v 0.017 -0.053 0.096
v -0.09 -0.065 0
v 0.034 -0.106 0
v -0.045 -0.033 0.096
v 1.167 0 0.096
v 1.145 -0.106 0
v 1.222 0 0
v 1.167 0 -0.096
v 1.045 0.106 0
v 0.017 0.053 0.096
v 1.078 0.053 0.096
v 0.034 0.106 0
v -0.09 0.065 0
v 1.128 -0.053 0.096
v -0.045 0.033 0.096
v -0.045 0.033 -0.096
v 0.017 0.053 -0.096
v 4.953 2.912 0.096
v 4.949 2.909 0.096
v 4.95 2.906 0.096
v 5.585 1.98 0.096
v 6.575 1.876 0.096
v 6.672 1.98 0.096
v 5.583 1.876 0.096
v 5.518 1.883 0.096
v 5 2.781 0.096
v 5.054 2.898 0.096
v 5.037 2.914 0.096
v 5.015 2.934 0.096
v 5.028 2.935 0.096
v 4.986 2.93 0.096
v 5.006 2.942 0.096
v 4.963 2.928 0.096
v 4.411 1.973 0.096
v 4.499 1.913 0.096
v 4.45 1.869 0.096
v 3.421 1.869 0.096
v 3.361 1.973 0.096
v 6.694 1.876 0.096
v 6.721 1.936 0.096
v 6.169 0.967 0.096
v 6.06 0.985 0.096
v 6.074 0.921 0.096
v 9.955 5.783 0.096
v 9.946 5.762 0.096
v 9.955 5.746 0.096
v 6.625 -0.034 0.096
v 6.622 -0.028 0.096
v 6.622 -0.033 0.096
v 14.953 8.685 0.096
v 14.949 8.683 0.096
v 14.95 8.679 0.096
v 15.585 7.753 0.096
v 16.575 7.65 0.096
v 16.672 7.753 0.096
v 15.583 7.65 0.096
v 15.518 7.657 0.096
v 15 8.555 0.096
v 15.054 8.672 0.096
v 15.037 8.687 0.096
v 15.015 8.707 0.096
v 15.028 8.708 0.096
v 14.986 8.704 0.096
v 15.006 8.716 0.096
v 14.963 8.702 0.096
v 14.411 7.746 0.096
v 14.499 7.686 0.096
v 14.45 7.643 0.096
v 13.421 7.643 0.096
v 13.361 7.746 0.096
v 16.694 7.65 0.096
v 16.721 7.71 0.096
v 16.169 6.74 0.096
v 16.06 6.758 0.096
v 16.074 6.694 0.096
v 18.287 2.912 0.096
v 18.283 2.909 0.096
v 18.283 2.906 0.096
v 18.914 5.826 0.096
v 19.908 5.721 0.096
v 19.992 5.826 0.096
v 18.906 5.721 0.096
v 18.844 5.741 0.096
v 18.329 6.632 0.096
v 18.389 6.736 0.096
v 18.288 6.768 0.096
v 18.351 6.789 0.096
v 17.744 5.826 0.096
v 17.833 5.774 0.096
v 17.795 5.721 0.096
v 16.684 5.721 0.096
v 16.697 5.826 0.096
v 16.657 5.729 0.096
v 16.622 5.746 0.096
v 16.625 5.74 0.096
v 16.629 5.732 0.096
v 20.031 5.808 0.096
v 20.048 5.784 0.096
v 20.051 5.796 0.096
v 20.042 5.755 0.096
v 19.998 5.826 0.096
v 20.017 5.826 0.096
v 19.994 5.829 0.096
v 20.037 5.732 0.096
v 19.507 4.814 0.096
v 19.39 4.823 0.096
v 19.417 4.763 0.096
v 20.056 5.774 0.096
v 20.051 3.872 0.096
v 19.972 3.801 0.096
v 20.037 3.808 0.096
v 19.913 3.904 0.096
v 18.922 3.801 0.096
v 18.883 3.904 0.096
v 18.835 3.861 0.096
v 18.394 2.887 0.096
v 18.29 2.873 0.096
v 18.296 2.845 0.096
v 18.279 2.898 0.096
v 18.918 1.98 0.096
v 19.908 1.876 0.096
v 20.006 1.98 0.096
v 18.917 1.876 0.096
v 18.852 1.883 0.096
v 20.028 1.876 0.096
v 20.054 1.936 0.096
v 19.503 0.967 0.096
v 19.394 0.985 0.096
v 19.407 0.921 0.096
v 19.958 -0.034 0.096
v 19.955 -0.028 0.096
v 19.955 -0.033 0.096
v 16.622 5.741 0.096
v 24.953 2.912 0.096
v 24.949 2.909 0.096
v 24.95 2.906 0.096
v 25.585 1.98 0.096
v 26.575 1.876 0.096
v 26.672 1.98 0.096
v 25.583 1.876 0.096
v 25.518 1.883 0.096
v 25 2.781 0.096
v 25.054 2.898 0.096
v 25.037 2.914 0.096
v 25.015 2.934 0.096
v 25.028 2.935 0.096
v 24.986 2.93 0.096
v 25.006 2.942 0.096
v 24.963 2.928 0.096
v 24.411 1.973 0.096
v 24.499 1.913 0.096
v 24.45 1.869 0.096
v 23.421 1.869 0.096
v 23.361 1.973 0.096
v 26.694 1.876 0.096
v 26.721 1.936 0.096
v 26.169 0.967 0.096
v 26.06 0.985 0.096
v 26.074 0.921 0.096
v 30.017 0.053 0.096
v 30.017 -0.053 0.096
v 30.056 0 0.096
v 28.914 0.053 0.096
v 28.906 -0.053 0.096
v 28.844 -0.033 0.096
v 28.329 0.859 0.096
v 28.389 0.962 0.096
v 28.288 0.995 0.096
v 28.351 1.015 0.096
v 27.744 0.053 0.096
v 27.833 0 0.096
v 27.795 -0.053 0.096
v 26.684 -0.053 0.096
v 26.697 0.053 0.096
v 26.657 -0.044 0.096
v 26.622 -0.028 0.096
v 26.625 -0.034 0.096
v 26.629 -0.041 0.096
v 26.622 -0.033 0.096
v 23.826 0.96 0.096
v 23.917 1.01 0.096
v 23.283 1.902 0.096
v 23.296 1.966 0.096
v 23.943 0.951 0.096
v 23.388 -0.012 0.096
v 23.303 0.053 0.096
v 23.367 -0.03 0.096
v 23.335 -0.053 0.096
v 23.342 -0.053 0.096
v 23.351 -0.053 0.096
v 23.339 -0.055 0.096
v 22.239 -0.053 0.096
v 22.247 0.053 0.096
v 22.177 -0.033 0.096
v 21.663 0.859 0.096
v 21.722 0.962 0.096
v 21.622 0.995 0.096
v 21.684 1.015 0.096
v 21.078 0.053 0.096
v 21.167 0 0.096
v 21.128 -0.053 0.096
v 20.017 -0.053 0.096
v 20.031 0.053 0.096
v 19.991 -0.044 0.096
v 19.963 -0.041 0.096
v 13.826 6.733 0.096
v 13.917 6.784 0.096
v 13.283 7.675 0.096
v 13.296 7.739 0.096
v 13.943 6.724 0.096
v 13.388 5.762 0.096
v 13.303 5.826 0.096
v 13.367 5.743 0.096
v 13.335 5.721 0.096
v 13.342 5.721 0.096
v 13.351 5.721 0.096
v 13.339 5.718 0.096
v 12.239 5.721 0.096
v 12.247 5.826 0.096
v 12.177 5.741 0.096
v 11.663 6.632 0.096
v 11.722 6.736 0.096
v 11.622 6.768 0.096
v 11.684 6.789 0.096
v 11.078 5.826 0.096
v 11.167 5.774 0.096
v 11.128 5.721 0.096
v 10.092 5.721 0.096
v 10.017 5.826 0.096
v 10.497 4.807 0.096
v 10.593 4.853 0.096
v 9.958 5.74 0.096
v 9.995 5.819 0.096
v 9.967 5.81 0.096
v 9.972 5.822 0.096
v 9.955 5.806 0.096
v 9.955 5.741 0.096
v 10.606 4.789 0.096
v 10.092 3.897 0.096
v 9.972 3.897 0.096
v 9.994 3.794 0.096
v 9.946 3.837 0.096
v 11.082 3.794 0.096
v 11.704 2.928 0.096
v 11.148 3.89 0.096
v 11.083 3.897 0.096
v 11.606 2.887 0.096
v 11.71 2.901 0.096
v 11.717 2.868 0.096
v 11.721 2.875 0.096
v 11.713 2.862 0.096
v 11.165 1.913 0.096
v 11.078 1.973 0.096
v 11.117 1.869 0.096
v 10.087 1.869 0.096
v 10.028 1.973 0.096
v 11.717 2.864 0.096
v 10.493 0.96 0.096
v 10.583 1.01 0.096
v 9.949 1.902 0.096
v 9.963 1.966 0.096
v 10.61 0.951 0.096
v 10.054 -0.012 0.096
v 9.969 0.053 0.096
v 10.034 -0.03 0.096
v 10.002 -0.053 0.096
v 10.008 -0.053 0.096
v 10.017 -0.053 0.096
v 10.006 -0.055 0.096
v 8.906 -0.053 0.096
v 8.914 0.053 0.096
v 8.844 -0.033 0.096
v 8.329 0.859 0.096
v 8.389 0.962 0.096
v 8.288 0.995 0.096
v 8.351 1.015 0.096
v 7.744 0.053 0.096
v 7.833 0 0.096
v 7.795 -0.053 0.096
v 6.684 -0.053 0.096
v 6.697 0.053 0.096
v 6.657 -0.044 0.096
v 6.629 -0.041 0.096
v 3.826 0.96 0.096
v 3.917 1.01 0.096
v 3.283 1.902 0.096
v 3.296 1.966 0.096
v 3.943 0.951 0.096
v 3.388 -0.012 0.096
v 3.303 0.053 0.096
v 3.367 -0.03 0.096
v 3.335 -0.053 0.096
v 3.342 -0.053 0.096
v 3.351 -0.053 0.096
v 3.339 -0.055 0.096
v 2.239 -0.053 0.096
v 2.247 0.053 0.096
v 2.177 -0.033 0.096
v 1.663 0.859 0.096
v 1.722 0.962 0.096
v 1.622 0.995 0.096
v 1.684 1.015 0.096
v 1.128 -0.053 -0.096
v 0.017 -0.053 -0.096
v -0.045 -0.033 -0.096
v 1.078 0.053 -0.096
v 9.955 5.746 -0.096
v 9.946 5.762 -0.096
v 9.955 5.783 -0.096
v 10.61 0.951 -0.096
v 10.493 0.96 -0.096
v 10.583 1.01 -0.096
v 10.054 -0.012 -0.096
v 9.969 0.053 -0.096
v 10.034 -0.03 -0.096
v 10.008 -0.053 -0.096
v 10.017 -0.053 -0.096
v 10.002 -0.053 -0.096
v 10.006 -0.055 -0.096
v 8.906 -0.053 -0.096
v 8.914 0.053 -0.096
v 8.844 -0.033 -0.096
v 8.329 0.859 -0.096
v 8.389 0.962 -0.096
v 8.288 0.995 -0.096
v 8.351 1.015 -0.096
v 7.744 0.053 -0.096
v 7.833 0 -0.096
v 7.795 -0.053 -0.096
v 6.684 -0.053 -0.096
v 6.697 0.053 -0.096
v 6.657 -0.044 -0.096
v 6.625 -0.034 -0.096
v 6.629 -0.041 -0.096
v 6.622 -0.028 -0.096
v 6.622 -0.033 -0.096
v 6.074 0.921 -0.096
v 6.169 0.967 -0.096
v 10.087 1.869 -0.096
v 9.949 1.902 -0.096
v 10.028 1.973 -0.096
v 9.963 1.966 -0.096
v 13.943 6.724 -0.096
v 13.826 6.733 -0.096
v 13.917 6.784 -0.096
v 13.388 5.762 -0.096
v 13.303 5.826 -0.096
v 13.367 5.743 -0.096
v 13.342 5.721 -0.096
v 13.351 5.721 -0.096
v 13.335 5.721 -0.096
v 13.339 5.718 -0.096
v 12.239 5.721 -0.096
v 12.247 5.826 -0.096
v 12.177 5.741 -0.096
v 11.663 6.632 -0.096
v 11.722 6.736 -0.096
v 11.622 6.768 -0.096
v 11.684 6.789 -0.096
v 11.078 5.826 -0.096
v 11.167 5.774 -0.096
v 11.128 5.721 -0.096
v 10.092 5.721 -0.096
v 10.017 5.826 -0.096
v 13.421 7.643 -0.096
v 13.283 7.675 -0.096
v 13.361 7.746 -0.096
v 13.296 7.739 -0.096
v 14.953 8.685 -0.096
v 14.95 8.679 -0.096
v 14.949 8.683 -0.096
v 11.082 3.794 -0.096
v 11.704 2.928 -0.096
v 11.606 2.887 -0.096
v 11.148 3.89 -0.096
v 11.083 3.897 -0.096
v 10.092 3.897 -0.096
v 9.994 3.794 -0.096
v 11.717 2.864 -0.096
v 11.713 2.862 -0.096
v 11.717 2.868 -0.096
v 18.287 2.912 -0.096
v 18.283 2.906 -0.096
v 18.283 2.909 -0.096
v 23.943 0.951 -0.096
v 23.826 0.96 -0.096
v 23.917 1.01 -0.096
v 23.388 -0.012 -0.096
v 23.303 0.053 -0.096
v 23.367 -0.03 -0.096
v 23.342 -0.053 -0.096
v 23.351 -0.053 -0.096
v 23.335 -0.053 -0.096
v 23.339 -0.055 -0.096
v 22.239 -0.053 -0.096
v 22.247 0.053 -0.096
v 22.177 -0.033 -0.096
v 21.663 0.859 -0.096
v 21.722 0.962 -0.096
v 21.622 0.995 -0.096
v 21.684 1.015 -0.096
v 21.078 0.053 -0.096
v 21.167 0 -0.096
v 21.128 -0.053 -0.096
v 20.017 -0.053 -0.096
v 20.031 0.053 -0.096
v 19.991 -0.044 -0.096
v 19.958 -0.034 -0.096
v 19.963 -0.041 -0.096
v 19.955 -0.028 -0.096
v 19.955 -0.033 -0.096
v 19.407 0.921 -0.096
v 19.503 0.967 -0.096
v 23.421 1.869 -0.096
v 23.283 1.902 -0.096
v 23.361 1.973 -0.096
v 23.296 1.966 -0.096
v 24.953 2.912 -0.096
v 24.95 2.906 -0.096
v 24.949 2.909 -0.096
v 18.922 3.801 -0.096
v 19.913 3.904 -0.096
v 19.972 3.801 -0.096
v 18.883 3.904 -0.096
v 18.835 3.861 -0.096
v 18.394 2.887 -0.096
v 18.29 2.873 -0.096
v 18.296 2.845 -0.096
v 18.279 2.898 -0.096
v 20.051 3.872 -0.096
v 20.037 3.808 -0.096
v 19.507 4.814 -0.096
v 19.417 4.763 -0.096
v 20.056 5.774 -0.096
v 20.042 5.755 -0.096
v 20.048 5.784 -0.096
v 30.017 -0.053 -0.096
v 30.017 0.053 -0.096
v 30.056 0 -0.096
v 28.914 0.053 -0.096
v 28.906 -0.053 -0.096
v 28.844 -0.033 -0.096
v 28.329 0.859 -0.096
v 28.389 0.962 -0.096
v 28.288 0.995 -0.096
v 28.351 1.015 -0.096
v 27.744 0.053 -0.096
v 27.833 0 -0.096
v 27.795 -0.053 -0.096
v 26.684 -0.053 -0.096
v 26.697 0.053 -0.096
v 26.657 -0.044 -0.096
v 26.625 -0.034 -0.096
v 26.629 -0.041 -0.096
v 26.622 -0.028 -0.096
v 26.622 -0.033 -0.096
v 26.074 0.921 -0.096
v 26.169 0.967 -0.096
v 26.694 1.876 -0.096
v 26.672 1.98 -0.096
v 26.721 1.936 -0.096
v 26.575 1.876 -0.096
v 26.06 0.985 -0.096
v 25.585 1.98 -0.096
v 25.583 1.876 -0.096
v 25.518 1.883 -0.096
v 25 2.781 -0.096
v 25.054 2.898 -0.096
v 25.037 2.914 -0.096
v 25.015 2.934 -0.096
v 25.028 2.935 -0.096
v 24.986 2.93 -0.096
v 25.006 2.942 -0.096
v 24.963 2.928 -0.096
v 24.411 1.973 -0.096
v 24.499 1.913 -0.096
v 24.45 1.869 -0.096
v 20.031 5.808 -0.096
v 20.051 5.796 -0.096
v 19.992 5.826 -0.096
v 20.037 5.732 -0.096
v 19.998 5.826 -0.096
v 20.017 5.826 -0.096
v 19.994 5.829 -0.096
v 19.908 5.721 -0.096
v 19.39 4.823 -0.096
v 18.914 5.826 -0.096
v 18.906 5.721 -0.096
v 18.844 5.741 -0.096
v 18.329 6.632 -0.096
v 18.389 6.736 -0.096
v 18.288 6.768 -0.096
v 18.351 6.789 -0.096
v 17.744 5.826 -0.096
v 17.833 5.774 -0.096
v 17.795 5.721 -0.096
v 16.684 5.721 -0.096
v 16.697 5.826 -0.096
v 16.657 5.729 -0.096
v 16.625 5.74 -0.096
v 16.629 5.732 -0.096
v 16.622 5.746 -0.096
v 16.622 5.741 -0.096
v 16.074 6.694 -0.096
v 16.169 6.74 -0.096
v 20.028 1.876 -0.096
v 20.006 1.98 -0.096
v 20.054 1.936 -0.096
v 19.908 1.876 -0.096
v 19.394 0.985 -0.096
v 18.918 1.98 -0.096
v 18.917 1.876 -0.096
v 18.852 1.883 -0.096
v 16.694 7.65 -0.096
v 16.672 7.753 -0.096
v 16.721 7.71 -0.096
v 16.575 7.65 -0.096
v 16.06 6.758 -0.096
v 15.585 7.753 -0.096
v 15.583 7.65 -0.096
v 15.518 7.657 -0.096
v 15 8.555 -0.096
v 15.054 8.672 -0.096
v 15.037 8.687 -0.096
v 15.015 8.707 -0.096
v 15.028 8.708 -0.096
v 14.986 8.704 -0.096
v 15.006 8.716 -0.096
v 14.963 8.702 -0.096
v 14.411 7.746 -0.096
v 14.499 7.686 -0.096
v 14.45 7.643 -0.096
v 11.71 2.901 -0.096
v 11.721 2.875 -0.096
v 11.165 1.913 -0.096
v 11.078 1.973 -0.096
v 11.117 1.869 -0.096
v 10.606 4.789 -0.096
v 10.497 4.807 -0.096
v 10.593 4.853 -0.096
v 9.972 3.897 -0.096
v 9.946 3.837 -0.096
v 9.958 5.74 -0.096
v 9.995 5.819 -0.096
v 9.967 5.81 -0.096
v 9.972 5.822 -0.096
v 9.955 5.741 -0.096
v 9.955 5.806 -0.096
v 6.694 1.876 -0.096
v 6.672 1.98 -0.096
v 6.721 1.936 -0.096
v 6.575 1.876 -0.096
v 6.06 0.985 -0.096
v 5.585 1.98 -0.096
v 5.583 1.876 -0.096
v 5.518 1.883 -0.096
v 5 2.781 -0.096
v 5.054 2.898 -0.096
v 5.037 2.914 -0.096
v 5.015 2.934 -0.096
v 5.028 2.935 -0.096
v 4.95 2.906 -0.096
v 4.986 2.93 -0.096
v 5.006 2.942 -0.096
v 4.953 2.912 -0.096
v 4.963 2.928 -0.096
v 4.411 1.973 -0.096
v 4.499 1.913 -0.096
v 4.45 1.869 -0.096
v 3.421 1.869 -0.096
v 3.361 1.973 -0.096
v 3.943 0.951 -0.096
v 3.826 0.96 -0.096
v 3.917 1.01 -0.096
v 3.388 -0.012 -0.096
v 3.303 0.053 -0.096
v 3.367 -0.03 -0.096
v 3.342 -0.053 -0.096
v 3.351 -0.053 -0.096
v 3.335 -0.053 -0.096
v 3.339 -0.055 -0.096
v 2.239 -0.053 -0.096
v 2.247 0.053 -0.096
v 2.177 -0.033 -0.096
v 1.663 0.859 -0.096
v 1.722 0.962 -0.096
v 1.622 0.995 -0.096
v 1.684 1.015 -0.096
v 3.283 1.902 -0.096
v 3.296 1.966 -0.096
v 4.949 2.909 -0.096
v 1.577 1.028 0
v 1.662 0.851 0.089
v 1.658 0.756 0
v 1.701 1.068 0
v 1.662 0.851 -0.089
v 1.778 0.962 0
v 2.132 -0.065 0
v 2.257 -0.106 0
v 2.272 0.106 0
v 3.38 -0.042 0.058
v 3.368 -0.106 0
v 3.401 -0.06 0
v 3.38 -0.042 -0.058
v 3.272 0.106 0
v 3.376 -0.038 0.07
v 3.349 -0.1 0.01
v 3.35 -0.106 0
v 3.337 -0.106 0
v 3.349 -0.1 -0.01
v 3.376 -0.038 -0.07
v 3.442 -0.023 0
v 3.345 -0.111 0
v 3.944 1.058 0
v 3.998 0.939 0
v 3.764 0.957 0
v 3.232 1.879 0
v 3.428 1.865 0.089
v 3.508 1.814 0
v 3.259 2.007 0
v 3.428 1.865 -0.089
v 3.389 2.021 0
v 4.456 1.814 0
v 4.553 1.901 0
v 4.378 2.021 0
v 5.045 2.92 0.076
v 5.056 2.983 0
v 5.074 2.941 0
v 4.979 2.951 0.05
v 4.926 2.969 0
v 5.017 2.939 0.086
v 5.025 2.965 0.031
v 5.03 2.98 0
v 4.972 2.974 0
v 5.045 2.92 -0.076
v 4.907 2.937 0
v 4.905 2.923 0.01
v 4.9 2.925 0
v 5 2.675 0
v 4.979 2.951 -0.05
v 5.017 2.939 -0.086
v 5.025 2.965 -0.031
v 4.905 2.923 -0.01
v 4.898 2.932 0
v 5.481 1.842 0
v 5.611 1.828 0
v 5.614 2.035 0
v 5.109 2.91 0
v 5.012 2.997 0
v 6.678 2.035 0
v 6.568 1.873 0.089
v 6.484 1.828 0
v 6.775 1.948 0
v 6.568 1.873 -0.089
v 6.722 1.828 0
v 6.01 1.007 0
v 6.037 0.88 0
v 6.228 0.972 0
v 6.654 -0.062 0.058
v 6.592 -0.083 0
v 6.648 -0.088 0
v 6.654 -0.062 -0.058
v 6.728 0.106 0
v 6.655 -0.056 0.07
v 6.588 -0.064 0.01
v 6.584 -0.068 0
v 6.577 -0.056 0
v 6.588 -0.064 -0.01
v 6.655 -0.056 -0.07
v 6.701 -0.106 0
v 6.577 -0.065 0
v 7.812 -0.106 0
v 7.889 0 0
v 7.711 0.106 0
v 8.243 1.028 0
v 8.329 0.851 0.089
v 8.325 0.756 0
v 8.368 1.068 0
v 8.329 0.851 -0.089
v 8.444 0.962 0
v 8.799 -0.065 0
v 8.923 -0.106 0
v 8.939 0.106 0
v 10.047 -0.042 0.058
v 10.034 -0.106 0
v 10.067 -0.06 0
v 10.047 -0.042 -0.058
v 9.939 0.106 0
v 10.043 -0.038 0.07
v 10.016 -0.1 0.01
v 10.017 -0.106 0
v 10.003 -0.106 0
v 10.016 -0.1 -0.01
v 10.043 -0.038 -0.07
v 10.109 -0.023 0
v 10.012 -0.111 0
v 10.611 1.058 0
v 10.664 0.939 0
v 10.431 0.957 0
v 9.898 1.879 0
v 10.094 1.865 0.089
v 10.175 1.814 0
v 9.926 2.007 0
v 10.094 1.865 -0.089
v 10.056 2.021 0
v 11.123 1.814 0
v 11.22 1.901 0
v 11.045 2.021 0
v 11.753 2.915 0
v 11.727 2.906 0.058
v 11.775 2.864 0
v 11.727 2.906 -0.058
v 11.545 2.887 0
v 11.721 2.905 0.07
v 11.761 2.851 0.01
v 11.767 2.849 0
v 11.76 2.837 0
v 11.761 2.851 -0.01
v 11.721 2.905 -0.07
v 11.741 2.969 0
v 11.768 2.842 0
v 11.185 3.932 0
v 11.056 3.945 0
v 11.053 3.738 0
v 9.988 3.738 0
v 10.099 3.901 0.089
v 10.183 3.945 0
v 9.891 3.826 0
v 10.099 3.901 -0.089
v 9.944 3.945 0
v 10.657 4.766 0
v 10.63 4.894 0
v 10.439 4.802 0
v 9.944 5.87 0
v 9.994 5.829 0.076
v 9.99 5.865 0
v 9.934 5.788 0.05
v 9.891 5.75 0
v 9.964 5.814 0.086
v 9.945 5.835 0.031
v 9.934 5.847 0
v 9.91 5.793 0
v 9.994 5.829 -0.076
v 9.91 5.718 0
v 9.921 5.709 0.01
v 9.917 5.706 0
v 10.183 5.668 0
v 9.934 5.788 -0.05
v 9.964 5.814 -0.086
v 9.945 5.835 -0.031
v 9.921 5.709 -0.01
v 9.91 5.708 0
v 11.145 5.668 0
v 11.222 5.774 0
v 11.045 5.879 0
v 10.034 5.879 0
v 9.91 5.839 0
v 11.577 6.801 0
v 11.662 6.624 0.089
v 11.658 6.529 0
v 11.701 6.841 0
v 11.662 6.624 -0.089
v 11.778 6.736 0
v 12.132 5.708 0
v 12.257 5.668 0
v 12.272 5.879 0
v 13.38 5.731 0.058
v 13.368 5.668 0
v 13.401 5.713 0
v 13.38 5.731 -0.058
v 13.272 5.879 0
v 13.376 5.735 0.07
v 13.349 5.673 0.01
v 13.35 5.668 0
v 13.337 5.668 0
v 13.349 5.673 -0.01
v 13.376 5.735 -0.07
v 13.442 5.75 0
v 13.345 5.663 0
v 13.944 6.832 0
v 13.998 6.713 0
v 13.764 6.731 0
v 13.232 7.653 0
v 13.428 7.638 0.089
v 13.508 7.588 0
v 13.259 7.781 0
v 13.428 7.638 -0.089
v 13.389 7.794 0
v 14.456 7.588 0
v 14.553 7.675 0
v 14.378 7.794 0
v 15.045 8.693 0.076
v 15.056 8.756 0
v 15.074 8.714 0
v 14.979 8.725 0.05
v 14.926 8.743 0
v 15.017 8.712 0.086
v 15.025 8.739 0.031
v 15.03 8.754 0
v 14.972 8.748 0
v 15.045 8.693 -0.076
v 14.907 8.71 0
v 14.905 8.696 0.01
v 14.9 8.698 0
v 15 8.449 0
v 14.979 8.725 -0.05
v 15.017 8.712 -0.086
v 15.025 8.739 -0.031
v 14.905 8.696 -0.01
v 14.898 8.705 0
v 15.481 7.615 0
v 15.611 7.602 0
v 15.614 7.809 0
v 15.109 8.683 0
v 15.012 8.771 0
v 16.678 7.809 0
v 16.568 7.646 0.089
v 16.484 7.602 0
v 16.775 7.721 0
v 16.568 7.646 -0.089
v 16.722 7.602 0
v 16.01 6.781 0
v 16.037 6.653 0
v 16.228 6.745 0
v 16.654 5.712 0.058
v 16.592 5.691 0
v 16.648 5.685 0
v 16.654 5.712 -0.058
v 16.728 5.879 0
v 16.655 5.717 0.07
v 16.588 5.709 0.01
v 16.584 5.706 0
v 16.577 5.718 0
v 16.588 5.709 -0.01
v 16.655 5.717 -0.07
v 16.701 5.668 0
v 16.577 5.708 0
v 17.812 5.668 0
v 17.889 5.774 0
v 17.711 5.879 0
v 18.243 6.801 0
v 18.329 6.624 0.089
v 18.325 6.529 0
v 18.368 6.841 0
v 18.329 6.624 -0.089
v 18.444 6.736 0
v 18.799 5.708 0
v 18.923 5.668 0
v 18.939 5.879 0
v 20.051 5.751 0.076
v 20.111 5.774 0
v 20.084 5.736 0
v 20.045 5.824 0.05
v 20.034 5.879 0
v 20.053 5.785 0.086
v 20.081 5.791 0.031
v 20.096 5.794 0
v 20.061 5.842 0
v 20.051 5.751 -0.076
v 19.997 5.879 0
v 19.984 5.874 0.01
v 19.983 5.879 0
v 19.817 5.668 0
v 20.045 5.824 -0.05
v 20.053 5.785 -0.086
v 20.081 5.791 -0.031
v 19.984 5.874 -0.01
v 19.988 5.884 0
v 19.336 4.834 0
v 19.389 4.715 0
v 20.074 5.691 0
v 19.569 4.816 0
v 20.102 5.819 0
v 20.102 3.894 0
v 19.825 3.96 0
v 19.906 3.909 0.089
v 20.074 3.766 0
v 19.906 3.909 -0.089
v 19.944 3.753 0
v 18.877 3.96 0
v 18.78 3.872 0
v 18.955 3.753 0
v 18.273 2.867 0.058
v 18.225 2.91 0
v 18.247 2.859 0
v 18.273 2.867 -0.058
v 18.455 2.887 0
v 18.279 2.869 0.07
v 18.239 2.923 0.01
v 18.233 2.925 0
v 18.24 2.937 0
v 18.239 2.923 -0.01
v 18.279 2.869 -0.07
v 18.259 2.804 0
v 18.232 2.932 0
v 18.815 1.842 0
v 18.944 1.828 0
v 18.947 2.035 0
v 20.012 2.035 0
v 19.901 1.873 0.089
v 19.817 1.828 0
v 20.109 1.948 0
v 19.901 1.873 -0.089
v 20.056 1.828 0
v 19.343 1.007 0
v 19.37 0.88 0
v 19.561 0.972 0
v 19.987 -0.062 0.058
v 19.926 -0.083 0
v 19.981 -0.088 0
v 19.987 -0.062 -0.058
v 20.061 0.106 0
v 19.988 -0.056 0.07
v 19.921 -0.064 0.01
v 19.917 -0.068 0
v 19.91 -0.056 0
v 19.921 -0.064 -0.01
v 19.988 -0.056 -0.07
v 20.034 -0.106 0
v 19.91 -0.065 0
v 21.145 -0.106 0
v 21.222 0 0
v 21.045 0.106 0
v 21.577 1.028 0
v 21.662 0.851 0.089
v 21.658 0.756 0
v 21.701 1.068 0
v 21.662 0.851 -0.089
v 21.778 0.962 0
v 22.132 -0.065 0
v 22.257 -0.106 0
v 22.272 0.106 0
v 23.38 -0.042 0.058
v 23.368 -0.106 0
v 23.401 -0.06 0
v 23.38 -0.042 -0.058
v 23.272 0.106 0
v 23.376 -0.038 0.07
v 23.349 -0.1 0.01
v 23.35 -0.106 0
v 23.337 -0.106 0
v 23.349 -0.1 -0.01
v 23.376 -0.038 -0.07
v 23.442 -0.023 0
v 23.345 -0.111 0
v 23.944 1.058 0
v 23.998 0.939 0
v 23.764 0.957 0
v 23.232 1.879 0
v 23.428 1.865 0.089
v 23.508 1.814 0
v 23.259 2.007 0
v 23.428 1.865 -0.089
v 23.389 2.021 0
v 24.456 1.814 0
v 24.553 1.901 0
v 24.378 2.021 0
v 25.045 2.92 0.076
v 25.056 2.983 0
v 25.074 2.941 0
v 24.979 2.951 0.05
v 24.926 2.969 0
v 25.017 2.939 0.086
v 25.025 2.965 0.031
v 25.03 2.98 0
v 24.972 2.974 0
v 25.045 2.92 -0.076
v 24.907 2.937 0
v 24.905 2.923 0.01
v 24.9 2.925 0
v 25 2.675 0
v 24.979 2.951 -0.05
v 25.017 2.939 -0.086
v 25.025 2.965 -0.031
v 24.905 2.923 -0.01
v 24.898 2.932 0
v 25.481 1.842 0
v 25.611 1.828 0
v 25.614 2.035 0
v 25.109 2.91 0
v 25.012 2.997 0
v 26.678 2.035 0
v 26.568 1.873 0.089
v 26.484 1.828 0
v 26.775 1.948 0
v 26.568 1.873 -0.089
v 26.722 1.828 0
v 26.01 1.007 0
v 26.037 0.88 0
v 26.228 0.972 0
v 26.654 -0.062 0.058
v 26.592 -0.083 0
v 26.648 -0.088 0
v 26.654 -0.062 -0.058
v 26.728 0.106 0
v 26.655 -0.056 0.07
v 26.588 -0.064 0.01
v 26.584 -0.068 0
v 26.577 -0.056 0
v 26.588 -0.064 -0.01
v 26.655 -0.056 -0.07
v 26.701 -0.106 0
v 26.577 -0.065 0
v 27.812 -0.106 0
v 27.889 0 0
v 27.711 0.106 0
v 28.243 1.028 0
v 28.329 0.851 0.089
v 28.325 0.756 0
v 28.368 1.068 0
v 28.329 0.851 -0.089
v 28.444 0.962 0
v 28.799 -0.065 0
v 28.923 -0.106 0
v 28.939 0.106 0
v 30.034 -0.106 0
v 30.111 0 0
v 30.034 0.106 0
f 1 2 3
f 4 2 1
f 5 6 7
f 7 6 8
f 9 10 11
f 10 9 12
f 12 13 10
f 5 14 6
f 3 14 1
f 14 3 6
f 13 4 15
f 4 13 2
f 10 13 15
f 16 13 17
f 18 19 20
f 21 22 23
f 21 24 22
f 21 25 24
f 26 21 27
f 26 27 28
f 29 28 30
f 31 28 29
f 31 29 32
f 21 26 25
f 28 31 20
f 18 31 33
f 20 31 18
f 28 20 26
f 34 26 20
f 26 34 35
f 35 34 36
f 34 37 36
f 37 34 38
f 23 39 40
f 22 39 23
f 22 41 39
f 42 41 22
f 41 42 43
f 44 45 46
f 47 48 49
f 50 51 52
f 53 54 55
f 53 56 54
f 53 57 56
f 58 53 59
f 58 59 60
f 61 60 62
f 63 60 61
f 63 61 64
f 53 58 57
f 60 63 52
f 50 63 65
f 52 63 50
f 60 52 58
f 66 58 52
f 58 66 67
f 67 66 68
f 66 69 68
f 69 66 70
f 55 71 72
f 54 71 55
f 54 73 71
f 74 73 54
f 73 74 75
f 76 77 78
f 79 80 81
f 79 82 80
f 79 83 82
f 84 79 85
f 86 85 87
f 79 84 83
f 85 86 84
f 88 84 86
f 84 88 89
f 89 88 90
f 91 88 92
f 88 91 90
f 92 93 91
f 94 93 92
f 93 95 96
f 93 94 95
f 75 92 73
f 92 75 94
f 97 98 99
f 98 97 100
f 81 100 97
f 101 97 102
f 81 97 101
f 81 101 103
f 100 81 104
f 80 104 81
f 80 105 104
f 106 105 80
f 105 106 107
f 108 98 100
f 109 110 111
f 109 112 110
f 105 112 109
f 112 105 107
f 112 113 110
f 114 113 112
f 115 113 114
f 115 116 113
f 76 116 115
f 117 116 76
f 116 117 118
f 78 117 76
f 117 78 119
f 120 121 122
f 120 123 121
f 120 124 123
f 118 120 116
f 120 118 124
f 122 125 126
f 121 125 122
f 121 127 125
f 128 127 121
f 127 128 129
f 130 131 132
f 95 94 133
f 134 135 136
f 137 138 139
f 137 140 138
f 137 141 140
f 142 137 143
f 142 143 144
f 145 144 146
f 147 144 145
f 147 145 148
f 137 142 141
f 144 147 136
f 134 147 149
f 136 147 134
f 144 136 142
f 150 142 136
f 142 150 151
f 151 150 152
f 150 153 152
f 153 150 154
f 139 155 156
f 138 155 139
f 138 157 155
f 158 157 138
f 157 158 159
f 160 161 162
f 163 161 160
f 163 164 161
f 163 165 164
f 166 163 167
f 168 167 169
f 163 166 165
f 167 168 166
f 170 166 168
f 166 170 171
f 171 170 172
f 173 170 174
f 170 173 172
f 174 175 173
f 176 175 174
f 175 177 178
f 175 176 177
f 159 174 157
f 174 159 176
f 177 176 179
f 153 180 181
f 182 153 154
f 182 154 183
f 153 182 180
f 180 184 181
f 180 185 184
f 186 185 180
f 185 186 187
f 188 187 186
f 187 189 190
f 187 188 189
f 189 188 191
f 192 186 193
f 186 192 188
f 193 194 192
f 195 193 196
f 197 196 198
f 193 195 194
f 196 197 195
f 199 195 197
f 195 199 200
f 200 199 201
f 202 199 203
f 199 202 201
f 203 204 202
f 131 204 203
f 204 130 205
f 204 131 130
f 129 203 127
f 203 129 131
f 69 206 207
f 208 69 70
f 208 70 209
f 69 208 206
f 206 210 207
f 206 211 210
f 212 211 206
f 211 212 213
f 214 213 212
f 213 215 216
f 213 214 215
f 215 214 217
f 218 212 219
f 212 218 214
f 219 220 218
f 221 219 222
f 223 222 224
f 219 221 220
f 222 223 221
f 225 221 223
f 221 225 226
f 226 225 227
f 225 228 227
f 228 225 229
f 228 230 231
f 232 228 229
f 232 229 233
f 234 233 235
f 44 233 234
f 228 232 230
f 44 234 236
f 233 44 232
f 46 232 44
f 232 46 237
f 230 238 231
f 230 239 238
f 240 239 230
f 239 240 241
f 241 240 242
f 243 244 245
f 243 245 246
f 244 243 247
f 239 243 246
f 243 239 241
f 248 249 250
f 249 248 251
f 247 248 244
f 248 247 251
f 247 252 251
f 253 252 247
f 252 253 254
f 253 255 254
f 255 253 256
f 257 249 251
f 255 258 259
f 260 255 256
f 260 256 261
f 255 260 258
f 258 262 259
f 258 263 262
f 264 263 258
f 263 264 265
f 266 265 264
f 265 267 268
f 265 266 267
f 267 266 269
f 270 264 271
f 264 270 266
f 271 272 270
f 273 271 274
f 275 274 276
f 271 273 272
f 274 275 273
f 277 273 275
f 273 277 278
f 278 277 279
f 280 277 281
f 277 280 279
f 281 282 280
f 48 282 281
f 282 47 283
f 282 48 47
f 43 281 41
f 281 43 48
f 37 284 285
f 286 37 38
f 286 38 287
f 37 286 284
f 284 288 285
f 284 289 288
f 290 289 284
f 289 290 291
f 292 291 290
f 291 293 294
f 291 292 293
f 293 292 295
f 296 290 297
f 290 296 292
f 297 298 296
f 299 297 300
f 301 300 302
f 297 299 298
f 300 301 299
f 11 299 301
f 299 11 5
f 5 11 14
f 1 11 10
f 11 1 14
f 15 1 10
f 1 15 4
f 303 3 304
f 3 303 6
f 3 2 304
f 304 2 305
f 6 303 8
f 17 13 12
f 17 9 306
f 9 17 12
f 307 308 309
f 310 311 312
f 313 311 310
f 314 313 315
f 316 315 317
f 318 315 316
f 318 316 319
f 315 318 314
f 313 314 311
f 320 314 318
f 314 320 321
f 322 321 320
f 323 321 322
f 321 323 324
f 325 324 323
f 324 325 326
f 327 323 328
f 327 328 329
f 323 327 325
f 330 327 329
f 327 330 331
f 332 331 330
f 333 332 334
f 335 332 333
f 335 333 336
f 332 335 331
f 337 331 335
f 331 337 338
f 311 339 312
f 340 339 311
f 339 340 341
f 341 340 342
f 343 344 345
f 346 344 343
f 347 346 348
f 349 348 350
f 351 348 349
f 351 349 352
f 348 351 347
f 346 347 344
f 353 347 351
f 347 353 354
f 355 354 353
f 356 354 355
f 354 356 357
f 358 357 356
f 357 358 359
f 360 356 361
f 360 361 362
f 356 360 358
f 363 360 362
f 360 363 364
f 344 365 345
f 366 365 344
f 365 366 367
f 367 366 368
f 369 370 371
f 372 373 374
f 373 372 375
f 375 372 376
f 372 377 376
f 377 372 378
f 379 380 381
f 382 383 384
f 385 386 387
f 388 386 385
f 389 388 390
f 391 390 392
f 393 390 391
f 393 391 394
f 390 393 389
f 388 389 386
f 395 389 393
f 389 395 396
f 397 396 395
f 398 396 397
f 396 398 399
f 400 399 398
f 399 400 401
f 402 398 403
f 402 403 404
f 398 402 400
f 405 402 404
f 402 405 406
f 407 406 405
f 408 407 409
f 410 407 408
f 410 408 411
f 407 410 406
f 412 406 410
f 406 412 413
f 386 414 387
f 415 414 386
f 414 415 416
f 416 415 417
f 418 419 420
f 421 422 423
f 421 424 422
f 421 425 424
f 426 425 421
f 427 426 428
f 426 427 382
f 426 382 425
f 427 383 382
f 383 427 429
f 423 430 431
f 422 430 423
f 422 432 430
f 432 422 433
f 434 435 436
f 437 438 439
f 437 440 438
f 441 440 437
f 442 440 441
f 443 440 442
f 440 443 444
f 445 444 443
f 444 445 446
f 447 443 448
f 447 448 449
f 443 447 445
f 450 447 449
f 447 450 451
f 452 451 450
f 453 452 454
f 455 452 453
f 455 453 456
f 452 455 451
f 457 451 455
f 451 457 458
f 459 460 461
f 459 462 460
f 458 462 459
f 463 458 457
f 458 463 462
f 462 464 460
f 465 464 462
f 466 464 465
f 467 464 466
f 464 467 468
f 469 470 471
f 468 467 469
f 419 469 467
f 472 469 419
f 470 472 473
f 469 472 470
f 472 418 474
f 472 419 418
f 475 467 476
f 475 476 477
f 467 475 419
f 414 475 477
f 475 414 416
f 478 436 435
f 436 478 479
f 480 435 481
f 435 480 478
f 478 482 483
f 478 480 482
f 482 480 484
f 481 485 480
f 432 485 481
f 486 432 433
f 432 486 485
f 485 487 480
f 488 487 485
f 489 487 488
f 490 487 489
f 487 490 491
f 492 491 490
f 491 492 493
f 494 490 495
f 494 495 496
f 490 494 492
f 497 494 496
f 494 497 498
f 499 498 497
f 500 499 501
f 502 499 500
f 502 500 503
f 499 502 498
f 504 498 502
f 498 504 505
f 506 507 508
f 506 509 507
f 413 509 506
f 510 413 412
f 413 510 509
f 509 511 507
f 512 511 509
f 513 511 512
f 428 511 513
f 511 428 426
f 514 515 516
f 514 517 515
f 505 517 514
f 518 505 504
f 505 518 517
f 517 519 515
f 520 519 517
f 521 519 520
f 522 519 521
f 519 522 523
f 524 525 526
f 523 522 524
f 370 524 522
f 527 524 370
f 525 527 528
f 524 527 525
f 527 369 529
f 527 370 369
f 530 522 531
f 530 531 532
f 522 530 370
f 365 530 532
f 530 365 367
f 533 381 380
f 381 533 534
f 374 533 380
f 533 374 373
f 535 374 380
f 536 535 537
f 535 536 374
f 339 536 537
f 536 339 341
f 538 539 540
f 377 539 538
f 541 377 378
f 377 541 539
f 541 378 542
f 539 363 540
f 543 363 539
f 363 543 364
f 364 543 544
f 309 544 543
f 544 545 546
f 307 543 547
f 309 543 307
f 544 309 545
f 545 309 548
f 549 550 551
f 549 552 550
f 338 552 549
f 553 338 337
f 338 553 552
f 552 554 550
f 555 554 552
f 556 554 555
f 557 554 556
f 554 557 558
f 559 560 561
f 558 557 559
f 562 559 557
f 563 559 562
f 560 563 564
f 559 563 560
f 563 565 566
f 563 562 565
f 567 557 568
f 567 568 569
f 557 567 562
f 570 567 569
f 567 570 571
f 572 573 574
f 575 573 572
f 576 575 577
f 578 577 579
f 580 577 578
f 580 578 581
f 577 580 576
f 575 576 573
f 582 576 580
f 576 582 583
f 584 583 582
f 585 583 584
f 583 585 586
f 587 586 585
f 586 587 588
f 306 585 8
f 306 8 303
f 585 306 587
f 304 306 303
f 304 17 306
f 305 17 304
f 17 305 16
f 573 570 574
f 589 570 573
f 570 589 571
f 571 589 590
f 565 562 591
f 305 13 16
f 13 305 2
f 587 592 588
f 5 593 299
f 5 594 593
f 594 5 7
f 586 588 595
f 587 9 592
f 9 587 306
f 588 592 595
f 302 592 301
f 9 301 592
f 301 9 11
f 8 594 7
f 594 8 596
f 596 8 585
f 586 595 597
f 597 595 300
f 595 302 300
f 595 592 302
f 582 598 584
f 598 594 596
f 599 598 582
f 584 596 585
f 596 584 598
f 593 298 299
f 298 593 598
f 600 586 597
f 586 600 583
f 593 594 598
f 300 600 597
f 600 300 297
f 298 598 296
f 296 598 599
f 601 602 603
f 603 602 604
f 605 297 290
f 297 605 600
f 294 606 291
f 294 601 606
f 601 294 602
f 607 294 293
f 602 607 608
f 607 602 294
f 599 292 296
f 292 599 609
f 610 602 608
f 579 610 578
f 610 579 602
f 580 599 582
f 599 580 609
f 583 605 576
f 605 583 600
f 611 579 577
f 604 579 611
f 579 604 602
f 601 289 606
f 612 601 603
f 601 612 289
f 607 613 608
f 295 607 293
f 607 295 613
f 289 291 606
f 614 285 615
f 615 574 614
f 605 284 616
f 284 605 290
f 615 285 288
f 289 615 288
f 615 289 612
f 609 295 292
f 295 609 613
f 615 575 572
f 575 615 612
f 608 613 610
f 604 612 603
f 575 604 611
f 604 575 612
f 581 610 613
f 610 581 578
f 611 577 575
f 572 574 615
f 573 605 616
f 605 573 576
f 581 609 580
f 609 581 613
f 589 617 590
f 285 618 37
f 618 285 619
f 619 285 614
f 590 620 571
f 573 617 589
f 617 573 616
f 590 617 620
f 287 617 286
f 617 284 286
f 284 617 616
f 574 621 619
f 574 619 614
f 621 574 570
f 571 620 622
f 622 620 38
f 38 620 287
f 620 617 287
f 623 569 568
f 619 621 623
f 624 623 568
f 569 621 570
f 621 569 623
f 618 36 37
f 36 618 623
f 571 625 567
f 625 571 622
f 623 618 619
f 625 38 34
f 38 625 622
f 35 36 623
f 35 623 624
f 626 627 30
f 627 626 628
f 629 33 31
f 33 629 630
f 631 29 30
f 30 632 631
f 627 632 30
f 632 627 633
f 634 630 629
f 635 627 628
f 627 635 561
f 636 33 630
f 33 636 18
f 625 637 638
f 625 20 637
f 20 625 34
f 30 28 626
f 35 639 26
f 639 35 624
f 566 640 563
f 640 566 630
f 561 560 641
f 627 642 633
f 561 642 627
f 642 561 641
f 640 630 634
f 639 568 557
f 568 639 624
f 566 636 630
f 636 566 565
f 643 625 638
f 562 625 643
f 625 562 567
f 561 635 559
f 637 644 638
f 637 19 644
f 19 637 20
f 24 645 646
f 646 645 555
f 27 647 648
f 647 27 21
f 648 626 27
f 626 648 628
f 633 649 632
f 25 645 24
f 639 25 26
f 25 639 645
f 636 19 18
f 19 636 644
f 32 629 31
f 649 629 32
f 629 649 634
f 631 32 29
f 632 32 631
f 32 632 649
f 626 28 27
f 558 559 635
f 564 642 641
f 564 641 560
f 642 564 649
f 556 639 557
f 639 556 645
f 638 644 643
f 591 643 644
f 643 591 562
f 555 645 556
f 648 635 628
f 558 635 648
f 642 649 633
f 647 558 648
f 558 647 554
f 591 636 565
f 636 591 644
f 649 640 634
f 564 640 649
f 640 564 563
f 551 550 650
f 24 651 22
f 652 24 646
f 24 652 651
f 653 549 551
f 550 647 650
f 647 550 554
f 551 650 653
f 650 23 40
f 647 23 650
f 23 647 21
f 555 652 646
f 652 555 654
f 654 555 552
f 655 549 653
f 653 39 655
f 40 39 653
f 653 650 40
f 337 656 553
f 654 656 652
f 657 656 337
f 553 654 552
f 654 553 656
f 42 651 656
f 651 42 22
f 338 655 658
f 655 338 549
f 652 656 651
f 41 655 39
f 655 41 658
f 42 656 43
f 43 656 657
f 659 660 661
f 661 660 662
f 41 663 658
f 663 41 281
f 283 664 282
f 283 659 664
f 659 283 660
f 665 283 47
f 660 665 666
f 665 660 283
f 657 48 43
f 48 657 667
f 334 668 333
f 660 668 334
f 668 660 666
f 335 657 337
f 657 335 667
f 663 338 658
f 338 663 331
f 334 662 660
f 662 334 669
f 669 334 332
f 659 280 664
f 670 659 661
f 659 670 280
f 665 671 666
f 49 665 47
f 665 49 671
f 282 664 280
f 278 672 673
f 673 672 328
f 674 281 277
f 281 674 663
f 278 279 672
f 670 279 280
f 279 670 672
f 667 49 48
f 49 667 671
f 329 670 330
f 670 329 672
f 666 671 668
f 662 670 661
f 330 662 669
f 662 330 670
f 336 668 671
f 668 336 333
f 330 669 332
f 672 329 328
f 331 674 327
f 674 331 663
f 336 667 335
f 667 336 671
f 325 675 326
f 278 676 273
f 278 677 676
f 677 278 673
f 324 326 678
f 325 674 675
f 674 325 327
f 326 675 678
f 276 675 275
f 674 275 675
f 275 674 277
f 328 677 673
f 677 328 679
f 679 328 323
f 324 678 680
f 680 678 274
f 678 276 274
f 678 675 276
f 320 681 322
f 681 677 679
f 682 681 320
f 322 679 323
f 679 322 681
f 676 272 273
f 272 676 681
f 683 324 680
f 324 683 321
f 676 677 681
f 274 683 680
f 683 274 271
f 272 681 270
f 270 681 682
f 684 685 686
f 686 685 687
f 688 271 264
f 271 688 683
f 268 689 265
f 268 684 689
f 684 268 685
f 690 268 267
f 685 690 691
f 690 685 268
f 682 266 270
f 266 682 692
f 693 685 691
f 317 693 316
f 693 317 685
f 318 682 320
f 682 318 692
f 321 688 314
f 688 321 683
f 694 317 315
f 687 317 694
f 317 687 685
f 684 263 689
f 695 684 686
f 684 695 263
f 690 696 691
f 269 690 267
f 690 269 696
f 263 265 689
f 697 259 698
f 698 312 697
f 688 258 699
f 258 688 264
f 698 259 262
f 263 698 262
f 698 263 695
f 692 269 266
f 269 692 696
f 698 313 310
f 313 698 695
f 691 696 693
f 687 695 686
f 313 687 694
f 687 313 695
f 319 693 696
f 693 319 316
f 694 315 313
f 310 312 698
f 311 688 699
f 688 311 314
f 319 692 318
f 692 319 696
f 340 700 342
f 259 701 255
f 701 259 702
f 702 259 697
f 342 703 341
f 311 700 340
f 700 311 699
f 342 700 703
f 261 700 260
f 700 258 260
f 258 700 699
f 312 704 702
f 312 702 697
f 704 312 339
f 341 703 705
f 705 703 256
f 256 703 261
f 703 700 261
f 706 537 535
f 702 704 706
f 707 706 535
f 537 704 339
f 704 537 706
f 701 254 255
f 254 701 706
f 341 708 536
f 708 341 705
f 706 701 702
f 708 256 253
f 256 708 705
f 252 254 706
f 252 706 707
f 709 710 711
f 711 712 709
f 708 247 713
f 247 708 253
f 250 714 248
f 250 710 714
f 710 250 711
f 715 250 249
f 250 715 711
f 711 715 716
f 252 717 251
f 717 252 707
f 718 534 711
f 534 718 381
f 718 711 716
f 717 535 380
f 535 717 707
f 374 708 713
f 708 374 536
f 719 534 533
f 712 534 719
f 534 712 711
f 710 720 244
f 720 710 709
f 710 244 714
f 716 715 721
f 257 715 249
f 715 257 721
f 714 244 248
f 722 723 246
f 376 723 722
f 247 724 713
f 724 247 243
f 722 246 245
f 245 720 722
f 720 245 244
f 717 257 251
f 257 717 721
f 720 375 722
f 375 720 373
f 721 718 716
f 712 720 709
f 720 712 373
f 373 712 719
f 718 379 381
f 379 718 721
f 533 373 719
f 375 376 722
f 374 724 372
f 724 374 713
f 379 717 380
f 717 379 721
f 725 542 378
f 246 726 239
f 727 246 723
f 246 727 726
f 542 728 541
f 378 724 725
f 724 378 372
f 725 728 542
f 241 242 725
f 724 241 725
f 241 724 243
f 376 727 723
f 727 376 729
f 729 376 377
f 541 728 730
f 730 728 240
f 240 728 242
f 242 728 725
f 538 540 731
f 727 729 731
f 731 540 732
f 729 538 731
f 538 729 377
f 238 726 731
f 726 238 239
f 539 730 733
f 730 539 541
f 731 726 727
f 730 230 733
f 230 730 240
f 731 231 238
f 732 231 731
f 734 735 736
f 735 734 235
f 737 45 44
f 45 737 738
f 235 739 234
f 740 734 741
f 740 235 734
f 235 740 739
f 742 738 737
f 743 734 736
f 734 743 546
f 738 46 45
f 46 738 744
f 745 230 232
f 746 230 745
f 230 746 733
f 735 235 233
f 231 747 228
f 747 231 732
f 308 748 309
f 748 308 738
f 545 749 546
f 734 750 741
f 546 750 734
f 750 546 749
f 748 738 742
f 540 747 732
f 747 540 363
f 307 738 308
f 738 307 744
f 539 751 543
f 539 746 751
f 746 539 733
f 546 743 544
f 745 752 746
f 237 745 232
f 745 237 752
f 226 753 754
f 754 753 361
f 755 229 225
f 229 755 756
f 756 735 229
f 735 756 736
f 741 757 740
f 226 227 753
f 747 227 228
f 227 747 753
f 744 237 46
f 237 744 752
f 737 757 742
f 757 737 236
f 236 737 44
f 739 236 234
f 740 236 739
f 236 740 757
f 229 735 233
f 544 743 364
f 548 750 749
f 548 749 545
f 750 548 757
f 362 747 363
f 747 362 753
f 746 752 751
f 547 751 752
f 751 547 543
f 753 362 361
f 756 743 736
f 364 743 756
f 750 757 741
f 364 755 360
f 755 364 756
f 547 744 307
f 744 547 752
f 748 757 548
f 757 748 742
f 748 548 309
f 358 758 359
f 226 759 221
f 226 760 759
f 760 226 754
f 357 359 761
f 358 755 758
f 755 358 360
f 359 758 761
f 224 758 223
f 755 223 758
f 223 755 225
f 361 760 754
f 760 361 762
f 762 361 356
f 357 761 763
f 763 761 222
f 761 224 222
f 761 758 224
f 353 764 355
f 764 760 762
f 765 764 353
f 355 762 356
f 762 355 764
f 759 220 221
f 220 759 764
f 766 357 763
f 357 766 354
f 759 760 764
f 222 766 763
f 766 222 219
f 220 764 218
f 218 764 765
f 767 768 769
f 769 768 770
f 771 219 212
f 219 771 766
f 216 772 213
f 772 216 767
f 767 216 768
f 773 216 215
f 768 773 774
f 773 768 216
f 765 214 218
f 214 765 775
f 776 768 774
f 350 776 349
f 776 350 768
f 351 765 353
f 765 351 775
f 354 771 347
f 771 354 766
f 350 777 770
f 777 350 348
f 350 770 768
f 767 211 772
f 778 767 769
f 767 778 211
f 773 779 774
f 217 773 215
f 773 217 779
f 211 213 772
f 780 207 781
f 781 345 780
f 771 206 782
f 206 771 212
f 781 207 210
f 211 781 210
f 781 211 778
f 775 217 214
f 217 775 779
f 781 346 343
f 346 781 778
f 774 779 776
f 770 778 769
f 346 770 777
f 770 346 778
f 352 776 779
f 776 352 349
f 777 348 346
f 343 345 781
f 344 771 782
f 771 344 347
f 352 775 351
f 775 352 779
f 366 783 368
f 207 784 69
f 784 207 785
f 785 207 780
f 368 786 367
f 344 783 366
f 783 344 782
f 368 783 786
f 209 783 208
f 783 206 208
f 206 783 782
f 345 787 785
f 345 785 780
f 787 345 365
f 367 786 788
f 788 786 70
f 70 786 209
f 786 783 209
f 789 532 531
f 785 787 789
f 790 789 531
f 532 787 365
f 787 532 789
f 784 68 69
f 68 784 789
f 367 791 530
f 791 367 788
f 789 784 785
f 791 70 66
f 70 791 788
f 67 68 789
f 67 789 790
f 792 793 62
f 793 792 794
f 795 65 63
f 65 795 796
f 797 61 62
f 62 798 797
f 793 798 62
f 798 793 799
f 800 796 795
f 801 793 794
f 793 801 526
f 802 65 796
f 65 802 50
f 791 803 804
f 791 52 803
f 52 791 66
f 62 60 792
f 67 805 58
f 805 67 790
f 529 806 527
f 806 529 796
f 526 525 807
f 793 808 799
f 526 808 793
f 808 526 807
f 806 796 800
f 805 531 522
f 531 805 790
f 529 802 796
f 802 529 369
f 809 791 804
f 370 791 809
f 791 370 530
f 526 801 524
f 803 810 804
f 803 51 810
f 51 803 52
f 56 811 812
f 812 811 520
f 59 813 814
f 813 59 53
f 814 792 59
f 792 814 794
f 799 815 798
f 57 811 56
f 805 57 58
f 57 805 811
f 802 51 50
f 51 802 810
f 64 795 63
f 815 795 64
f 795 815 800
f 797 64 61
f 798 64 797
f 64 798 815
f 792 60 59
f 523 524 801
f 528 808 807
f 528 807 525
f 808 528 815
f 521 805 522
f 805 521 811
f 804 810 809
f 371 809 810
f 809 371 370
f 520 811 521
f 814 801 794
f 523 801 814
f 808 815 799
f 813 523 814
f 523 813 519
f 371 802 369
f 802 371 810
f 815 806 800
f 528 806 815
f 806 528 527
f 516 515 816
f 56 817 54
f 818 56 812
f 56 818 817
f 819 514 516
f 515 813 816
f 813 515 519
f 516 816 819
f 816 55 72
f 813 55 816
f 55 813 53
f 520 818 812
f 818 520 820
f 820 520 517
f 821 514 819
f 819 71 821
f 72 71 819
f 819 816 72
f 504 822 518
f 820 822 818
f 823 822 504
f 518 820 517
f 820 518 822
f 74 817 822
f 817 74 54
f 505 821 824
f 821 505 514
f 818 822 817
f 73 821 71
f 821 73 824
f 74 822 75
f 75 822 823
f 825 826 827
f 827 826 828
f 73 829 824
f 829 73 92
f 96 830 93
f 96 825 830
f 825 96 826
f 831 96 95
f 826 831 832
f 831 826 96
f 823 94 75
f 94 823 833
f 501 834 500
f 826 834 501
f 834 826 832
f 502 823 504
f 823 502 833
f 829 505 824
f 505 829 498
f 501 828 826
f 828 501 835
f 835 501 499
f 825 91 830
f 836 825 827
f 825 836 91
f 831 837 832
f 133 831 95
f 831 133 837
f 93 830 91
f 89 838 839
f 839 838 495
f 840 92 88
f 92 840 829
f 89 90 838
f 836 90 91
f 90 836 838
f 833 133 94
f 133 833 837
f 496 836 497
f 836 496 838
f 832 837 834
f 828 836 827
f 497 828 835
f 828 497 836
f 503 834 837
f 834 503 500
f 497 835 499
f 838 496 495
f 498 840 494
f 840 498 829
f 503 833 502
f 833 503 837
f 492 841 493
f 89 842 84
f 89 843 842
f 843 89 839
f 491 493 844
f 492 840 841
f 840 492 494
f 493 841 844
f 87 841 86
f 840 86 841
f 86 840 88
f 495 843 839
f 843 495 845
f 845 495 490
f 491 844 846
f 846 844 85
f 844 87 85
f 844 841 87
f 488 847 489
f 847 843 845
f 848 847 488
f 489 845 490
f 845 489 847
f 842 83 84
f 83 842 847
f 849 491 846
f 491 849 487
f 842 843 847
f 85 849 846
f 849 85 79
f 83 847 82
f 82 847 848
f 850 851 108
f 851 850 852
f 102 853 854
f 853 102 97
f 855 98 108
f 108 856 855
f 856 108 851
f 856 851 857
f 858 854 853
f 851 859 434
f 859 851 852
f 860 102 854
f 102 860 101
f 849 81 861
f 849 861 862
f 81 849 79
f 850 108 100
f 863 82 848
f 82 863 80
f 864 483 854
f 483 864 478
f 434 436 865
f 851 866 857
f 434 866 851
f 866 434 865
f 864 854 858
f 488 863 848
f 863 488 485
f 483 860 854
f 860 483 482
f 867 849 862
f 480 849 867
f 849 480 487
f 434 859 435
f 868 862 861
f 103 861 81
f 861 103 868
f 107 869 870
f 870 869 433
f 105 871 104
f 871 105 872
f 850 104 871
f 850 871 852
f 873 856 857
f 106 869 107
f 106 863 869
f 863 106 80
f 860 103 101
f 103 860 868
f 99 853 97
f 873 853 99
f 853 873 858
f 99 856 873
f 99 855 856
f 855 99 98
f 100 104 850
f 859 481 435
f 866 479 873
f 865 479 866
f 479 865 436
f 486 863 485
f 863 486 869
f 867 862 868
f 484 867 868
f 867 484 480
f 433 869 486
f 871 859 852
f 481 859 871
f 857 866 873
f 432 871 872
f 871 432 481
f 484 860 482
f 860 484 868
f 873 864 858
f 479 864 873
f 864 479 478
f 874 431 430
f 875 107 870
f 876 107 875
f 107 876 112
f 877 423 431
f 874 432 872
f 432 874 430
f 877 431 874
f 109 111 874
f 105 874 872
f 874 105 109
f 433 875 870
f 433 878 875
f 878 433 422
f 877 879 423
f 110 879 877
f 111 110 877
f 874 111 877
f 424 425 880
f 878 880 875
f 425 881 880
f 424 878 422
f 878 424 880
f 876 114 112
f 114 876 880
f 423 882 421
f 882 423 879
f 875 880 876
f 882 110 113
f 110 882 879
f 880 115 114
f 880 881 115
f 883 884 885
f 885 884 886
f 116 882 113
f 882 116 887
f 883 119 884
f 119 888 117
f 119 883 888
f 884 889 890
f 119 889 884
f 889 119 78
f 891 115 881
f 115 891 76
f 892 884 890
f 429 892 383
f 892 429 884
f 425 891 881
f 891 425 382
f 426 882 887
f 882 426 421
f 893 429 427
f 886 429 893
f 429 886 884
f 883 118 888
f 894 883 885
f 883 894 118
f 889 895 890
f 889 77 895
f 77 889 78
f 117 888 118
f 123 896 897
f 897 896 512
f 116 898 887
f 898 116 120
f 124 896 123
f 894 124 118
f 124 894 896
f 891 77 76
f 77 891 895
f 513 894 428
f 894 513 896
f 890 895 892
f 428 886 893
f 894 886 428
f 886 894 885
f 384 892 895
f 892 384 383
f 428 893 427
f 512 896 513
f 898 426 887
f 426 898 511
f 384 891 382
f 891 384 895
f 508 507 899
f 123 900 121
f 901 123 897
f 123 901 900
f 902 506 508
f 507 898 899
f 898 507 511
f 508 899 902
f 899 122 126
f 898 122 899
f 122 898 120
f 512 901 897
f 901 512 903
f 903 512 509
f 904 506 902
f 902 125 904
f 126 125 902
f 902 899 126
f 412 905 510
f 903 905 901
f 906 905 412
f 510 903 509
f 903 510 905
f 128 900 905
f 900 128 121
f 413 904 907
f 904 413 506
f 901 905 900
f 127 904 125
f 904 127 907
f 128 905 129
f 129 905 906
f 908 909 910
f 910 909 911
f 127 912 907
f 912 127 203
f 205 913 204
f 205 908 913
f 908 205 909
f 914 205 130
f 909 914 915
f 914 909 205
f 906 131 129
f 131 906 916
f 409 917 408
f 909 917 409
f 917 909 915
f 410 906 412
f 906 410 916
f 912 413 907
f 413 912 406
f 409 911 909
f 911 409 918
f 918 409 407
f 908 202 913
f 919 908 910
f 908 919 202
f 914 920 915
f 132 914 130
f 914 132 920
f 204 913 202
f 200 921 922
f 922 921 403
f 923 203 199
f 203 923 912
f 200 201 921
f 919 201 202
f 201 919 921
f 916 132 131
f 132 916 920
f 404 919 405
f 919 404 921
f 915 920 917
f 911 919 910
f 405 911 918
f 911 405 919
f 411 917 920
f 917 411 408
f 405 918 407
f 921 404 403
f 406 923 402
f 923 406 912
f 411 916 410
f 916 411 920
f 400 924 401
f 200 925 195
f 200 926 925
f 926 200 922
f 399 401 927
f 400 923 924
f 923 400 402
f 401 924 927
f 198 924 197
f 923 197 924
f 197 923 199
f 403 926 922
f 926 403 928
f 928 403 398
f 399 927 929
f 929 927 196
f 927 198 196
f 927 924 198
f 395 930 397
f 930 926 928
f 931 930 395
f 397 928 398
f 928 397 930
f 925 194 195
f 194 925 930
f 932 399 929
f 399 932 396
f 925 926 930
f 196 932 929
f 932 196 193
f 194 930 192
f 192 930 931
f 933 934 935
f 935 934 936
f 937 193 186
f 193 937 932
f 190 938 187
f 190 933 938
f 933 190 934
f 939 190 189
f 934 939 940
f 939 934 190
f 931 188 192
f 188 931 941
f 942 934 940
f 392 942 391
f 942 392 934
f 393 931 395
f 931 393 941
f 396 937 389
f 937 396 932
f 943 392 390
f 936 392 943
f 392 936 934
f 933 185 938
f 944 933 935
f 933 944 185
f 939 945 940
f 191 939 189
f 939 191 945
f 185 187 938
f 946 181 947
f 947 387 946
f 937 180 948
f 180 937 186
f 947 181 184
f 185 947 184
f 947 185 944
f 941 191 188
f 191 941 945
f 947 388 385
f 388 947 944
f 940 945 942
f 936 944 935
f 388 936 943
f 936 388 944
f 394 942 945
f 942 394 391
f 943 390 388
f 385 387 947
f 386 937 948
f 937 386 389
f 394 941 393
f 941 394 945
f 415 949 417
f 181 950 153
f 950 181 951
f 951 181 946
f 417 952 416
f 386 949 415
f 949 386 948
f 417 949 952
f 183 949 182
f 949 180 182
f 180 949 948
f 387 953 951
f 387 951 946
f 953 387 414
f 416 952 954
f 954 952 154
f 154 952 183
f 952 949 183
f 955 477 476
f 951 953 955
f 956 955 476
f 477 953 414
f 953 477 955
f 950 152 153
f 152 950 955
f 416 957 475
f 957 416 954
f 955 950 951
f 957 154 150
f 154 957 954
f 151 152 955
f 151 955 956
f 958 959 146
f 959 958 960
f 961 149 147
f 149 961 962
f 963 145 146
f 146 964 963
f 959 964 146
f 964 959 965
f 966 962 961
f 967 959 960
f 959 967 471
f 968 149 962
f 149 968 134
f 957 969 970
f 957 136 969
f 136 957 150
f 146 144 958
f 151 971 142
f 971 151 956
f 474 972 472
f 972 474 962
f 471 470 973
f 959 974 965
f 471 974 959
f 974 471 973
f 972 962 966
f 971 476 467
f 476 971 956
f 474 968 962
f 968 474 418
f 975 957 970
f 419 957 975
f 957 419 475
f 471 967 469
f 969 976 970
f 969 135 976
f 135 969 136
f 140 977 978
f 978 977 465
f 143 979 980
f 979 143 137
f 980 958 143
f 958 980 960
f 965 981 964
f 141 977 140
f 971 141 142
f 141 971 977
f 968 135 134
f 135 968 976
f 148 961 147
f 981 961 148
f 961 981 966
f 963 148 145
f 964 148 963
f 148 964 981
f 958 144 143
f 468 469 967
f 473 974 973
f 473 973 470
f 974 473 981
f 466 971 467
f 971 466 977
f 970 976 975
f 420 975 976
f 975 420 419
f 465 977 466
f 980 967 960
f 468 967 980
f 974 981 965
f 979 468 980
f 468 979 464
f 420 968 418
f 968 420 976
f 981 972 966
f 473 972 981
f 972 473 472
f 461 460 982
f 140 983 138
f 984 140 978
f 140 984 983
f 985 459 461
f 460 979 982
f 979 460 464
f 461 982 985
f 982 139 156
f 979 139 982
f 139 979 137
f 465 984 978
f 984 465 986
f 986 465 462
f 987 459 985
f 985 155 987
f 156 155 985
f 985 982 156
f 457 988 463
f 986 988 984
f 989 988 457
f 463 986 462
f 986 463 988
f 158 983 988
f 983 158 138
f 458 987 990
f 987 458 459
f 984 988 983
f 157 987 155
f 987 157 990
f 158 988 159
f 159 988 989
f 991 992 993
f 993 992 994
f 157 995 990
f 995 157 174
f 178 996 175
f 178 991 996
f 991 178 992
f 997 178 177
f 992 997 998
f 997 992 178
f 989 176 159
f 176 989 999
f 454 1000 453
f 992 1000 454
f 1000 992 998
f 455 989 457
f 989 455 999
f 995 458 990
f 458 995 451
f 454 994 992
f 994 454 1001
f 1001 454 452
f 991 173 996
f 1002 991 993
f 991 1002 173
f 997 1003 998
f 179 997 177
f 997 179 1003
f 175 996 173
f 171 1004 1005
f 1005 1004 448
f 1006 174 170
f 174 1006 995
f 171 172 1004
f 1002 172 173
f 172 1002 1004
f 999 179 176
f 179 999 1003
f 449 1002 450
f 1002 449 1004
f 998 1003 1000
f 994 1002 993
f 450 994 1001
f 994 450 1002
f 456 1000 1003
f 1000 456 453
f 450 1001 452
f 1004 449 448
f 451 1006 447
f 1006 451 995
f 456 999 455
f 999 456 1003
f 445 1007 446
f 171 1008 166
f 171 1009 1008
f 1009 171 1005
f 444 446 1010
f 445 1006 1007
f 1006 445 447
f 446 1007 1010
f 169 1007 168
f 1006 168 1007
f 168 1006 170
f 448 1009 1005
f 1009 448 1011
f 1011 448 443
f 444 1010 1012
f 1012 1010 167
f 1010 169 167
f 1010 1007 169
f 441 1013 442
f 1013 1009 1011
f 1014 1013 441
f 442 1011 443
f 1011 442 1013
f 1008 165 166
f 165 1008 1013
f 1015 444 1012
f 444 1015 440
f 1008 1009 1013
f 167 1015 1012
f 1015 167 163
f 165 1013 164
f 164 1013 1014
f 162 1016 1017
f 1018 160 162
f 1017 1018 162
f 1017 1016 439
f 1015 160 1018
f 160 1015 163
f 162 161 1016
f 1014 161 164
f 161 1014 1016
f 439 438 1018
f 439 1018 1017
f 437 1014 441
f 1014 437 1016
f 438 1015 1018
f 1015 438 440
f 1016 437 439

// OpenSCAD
/*
Test fractal pour pas changer 😛
v0.1
*/


//points=[[0,0],[5,0],[5,5],[10,5],[10,0],[15,0],[20,0]];
//points=[[0,0],[2,2],[4,0],[6,-2],[8,0]];
//points=[[0,0],[10,0],[10,10],[0,10],[0,20],[10,20],[20,20],[30,20],[30,10],[20,10],[20,0],[30,0]];
//points=[[0,0],[20,0],[cos(-60)*20,-sin(-60)*20],[20+cos(60)*20,-sin(-60)*20],[20,0],[40,0]];
//points=[[0,0],[10,0],[10,10],[20,10],[20,0],[20,-10],[30,-10],[30,0],[40,0]];
//points=[[0,0],[20,0],[cos(-60)*20*3,-sin(-60)*20],[cos(-60)*20*2,-sin(-60)*20*2],[cos(-60)*20*3,-sin(-60)*20*3],[cos(-60)*20*5,-sin(-60)*20*3],[cos(-60)*20*6,-sin(-60)*20*2],[cos(-60)*20*5,-sin(-60)*20],[cos(-60)*20*6,0],[cos(-60)*20*8,0]];
//points=[[],[],[],[],[],[],[],[],[],[],[],[],[],[]];
points=[[0,0],[10,0],[cos(60)*30,sin(60)*10],[20,0],[30,0]];
max_iter=3;

// La variable "longueur" est égal à l'hypoténuse entre le premier point et le dernier point.
// Il y a actuellement un problème lorsque lorsque le Y du dernier point n'est pas à 0
longueur=sqrt((points[len(points)-1][0]-points[0][0])*(points[len(points)-1][0]-points[0][0])+(points[len(points)-1][1]-points[0][1])*(points[len(points)-1][0]-points[0][0]));


//toto(it=1,mit=1);
//translate([40,0,0])toto(it=1,mit=2);
//translate([80,0,0])toto(it=1,mit=3);
toto(it=1,mit=max_iter);



module toto()
{
    if(it==mit)
    {
        for(i=[0:len(points)-2])
        {
            hull()
            {
                translate([points[i][0],points[i][1],0])        // Ici se crééent les vecteurs réunissan
                sphere();                                       // les différents points.
                translate([points[i+1][0],points[i+1][1],0])    // Ils ne s'affichent que si la dernière 
                sphere();                                       // itération est atteinte.
            }
        }
    }
    if(it<=mit)
    {
        for(i=[0:len(points)-2])
        {
            // Longueur2 se calcule à chaque fois et est la longueur entre le point utilisé et le point suivant.
            longueur2=sqrt(((points[i+1][0]-points[i][0])*(points[i+1][0]-points[i][0]))+((points[i+1][1]-points[i][1])*(points[i+1][1]-points[i][1])));
            // ang sert à calculer l'angle existant entre les deux points utilisés
            ang=atan2(points[i+1][1]-points[i][1],points[i+1][0]-points[i][0]);
            // On place l'objet là où il doit être
            translate([points[i][0],points[i][1],0])
            // On change sa taille pour que la taille de l'objet soit égale à la taille du vecteur
            scale([longueur2/longueur,longueur2/longueur,longueur2/longueur])
            // Et on effectue une rotation pour que l'objet rejoigne bien le point suivant
            rotate([0,0,ang])
            // On appelle l'objet en agumentation son itération
            toto(it=it+1,mit=mit);
        }
    }
}
